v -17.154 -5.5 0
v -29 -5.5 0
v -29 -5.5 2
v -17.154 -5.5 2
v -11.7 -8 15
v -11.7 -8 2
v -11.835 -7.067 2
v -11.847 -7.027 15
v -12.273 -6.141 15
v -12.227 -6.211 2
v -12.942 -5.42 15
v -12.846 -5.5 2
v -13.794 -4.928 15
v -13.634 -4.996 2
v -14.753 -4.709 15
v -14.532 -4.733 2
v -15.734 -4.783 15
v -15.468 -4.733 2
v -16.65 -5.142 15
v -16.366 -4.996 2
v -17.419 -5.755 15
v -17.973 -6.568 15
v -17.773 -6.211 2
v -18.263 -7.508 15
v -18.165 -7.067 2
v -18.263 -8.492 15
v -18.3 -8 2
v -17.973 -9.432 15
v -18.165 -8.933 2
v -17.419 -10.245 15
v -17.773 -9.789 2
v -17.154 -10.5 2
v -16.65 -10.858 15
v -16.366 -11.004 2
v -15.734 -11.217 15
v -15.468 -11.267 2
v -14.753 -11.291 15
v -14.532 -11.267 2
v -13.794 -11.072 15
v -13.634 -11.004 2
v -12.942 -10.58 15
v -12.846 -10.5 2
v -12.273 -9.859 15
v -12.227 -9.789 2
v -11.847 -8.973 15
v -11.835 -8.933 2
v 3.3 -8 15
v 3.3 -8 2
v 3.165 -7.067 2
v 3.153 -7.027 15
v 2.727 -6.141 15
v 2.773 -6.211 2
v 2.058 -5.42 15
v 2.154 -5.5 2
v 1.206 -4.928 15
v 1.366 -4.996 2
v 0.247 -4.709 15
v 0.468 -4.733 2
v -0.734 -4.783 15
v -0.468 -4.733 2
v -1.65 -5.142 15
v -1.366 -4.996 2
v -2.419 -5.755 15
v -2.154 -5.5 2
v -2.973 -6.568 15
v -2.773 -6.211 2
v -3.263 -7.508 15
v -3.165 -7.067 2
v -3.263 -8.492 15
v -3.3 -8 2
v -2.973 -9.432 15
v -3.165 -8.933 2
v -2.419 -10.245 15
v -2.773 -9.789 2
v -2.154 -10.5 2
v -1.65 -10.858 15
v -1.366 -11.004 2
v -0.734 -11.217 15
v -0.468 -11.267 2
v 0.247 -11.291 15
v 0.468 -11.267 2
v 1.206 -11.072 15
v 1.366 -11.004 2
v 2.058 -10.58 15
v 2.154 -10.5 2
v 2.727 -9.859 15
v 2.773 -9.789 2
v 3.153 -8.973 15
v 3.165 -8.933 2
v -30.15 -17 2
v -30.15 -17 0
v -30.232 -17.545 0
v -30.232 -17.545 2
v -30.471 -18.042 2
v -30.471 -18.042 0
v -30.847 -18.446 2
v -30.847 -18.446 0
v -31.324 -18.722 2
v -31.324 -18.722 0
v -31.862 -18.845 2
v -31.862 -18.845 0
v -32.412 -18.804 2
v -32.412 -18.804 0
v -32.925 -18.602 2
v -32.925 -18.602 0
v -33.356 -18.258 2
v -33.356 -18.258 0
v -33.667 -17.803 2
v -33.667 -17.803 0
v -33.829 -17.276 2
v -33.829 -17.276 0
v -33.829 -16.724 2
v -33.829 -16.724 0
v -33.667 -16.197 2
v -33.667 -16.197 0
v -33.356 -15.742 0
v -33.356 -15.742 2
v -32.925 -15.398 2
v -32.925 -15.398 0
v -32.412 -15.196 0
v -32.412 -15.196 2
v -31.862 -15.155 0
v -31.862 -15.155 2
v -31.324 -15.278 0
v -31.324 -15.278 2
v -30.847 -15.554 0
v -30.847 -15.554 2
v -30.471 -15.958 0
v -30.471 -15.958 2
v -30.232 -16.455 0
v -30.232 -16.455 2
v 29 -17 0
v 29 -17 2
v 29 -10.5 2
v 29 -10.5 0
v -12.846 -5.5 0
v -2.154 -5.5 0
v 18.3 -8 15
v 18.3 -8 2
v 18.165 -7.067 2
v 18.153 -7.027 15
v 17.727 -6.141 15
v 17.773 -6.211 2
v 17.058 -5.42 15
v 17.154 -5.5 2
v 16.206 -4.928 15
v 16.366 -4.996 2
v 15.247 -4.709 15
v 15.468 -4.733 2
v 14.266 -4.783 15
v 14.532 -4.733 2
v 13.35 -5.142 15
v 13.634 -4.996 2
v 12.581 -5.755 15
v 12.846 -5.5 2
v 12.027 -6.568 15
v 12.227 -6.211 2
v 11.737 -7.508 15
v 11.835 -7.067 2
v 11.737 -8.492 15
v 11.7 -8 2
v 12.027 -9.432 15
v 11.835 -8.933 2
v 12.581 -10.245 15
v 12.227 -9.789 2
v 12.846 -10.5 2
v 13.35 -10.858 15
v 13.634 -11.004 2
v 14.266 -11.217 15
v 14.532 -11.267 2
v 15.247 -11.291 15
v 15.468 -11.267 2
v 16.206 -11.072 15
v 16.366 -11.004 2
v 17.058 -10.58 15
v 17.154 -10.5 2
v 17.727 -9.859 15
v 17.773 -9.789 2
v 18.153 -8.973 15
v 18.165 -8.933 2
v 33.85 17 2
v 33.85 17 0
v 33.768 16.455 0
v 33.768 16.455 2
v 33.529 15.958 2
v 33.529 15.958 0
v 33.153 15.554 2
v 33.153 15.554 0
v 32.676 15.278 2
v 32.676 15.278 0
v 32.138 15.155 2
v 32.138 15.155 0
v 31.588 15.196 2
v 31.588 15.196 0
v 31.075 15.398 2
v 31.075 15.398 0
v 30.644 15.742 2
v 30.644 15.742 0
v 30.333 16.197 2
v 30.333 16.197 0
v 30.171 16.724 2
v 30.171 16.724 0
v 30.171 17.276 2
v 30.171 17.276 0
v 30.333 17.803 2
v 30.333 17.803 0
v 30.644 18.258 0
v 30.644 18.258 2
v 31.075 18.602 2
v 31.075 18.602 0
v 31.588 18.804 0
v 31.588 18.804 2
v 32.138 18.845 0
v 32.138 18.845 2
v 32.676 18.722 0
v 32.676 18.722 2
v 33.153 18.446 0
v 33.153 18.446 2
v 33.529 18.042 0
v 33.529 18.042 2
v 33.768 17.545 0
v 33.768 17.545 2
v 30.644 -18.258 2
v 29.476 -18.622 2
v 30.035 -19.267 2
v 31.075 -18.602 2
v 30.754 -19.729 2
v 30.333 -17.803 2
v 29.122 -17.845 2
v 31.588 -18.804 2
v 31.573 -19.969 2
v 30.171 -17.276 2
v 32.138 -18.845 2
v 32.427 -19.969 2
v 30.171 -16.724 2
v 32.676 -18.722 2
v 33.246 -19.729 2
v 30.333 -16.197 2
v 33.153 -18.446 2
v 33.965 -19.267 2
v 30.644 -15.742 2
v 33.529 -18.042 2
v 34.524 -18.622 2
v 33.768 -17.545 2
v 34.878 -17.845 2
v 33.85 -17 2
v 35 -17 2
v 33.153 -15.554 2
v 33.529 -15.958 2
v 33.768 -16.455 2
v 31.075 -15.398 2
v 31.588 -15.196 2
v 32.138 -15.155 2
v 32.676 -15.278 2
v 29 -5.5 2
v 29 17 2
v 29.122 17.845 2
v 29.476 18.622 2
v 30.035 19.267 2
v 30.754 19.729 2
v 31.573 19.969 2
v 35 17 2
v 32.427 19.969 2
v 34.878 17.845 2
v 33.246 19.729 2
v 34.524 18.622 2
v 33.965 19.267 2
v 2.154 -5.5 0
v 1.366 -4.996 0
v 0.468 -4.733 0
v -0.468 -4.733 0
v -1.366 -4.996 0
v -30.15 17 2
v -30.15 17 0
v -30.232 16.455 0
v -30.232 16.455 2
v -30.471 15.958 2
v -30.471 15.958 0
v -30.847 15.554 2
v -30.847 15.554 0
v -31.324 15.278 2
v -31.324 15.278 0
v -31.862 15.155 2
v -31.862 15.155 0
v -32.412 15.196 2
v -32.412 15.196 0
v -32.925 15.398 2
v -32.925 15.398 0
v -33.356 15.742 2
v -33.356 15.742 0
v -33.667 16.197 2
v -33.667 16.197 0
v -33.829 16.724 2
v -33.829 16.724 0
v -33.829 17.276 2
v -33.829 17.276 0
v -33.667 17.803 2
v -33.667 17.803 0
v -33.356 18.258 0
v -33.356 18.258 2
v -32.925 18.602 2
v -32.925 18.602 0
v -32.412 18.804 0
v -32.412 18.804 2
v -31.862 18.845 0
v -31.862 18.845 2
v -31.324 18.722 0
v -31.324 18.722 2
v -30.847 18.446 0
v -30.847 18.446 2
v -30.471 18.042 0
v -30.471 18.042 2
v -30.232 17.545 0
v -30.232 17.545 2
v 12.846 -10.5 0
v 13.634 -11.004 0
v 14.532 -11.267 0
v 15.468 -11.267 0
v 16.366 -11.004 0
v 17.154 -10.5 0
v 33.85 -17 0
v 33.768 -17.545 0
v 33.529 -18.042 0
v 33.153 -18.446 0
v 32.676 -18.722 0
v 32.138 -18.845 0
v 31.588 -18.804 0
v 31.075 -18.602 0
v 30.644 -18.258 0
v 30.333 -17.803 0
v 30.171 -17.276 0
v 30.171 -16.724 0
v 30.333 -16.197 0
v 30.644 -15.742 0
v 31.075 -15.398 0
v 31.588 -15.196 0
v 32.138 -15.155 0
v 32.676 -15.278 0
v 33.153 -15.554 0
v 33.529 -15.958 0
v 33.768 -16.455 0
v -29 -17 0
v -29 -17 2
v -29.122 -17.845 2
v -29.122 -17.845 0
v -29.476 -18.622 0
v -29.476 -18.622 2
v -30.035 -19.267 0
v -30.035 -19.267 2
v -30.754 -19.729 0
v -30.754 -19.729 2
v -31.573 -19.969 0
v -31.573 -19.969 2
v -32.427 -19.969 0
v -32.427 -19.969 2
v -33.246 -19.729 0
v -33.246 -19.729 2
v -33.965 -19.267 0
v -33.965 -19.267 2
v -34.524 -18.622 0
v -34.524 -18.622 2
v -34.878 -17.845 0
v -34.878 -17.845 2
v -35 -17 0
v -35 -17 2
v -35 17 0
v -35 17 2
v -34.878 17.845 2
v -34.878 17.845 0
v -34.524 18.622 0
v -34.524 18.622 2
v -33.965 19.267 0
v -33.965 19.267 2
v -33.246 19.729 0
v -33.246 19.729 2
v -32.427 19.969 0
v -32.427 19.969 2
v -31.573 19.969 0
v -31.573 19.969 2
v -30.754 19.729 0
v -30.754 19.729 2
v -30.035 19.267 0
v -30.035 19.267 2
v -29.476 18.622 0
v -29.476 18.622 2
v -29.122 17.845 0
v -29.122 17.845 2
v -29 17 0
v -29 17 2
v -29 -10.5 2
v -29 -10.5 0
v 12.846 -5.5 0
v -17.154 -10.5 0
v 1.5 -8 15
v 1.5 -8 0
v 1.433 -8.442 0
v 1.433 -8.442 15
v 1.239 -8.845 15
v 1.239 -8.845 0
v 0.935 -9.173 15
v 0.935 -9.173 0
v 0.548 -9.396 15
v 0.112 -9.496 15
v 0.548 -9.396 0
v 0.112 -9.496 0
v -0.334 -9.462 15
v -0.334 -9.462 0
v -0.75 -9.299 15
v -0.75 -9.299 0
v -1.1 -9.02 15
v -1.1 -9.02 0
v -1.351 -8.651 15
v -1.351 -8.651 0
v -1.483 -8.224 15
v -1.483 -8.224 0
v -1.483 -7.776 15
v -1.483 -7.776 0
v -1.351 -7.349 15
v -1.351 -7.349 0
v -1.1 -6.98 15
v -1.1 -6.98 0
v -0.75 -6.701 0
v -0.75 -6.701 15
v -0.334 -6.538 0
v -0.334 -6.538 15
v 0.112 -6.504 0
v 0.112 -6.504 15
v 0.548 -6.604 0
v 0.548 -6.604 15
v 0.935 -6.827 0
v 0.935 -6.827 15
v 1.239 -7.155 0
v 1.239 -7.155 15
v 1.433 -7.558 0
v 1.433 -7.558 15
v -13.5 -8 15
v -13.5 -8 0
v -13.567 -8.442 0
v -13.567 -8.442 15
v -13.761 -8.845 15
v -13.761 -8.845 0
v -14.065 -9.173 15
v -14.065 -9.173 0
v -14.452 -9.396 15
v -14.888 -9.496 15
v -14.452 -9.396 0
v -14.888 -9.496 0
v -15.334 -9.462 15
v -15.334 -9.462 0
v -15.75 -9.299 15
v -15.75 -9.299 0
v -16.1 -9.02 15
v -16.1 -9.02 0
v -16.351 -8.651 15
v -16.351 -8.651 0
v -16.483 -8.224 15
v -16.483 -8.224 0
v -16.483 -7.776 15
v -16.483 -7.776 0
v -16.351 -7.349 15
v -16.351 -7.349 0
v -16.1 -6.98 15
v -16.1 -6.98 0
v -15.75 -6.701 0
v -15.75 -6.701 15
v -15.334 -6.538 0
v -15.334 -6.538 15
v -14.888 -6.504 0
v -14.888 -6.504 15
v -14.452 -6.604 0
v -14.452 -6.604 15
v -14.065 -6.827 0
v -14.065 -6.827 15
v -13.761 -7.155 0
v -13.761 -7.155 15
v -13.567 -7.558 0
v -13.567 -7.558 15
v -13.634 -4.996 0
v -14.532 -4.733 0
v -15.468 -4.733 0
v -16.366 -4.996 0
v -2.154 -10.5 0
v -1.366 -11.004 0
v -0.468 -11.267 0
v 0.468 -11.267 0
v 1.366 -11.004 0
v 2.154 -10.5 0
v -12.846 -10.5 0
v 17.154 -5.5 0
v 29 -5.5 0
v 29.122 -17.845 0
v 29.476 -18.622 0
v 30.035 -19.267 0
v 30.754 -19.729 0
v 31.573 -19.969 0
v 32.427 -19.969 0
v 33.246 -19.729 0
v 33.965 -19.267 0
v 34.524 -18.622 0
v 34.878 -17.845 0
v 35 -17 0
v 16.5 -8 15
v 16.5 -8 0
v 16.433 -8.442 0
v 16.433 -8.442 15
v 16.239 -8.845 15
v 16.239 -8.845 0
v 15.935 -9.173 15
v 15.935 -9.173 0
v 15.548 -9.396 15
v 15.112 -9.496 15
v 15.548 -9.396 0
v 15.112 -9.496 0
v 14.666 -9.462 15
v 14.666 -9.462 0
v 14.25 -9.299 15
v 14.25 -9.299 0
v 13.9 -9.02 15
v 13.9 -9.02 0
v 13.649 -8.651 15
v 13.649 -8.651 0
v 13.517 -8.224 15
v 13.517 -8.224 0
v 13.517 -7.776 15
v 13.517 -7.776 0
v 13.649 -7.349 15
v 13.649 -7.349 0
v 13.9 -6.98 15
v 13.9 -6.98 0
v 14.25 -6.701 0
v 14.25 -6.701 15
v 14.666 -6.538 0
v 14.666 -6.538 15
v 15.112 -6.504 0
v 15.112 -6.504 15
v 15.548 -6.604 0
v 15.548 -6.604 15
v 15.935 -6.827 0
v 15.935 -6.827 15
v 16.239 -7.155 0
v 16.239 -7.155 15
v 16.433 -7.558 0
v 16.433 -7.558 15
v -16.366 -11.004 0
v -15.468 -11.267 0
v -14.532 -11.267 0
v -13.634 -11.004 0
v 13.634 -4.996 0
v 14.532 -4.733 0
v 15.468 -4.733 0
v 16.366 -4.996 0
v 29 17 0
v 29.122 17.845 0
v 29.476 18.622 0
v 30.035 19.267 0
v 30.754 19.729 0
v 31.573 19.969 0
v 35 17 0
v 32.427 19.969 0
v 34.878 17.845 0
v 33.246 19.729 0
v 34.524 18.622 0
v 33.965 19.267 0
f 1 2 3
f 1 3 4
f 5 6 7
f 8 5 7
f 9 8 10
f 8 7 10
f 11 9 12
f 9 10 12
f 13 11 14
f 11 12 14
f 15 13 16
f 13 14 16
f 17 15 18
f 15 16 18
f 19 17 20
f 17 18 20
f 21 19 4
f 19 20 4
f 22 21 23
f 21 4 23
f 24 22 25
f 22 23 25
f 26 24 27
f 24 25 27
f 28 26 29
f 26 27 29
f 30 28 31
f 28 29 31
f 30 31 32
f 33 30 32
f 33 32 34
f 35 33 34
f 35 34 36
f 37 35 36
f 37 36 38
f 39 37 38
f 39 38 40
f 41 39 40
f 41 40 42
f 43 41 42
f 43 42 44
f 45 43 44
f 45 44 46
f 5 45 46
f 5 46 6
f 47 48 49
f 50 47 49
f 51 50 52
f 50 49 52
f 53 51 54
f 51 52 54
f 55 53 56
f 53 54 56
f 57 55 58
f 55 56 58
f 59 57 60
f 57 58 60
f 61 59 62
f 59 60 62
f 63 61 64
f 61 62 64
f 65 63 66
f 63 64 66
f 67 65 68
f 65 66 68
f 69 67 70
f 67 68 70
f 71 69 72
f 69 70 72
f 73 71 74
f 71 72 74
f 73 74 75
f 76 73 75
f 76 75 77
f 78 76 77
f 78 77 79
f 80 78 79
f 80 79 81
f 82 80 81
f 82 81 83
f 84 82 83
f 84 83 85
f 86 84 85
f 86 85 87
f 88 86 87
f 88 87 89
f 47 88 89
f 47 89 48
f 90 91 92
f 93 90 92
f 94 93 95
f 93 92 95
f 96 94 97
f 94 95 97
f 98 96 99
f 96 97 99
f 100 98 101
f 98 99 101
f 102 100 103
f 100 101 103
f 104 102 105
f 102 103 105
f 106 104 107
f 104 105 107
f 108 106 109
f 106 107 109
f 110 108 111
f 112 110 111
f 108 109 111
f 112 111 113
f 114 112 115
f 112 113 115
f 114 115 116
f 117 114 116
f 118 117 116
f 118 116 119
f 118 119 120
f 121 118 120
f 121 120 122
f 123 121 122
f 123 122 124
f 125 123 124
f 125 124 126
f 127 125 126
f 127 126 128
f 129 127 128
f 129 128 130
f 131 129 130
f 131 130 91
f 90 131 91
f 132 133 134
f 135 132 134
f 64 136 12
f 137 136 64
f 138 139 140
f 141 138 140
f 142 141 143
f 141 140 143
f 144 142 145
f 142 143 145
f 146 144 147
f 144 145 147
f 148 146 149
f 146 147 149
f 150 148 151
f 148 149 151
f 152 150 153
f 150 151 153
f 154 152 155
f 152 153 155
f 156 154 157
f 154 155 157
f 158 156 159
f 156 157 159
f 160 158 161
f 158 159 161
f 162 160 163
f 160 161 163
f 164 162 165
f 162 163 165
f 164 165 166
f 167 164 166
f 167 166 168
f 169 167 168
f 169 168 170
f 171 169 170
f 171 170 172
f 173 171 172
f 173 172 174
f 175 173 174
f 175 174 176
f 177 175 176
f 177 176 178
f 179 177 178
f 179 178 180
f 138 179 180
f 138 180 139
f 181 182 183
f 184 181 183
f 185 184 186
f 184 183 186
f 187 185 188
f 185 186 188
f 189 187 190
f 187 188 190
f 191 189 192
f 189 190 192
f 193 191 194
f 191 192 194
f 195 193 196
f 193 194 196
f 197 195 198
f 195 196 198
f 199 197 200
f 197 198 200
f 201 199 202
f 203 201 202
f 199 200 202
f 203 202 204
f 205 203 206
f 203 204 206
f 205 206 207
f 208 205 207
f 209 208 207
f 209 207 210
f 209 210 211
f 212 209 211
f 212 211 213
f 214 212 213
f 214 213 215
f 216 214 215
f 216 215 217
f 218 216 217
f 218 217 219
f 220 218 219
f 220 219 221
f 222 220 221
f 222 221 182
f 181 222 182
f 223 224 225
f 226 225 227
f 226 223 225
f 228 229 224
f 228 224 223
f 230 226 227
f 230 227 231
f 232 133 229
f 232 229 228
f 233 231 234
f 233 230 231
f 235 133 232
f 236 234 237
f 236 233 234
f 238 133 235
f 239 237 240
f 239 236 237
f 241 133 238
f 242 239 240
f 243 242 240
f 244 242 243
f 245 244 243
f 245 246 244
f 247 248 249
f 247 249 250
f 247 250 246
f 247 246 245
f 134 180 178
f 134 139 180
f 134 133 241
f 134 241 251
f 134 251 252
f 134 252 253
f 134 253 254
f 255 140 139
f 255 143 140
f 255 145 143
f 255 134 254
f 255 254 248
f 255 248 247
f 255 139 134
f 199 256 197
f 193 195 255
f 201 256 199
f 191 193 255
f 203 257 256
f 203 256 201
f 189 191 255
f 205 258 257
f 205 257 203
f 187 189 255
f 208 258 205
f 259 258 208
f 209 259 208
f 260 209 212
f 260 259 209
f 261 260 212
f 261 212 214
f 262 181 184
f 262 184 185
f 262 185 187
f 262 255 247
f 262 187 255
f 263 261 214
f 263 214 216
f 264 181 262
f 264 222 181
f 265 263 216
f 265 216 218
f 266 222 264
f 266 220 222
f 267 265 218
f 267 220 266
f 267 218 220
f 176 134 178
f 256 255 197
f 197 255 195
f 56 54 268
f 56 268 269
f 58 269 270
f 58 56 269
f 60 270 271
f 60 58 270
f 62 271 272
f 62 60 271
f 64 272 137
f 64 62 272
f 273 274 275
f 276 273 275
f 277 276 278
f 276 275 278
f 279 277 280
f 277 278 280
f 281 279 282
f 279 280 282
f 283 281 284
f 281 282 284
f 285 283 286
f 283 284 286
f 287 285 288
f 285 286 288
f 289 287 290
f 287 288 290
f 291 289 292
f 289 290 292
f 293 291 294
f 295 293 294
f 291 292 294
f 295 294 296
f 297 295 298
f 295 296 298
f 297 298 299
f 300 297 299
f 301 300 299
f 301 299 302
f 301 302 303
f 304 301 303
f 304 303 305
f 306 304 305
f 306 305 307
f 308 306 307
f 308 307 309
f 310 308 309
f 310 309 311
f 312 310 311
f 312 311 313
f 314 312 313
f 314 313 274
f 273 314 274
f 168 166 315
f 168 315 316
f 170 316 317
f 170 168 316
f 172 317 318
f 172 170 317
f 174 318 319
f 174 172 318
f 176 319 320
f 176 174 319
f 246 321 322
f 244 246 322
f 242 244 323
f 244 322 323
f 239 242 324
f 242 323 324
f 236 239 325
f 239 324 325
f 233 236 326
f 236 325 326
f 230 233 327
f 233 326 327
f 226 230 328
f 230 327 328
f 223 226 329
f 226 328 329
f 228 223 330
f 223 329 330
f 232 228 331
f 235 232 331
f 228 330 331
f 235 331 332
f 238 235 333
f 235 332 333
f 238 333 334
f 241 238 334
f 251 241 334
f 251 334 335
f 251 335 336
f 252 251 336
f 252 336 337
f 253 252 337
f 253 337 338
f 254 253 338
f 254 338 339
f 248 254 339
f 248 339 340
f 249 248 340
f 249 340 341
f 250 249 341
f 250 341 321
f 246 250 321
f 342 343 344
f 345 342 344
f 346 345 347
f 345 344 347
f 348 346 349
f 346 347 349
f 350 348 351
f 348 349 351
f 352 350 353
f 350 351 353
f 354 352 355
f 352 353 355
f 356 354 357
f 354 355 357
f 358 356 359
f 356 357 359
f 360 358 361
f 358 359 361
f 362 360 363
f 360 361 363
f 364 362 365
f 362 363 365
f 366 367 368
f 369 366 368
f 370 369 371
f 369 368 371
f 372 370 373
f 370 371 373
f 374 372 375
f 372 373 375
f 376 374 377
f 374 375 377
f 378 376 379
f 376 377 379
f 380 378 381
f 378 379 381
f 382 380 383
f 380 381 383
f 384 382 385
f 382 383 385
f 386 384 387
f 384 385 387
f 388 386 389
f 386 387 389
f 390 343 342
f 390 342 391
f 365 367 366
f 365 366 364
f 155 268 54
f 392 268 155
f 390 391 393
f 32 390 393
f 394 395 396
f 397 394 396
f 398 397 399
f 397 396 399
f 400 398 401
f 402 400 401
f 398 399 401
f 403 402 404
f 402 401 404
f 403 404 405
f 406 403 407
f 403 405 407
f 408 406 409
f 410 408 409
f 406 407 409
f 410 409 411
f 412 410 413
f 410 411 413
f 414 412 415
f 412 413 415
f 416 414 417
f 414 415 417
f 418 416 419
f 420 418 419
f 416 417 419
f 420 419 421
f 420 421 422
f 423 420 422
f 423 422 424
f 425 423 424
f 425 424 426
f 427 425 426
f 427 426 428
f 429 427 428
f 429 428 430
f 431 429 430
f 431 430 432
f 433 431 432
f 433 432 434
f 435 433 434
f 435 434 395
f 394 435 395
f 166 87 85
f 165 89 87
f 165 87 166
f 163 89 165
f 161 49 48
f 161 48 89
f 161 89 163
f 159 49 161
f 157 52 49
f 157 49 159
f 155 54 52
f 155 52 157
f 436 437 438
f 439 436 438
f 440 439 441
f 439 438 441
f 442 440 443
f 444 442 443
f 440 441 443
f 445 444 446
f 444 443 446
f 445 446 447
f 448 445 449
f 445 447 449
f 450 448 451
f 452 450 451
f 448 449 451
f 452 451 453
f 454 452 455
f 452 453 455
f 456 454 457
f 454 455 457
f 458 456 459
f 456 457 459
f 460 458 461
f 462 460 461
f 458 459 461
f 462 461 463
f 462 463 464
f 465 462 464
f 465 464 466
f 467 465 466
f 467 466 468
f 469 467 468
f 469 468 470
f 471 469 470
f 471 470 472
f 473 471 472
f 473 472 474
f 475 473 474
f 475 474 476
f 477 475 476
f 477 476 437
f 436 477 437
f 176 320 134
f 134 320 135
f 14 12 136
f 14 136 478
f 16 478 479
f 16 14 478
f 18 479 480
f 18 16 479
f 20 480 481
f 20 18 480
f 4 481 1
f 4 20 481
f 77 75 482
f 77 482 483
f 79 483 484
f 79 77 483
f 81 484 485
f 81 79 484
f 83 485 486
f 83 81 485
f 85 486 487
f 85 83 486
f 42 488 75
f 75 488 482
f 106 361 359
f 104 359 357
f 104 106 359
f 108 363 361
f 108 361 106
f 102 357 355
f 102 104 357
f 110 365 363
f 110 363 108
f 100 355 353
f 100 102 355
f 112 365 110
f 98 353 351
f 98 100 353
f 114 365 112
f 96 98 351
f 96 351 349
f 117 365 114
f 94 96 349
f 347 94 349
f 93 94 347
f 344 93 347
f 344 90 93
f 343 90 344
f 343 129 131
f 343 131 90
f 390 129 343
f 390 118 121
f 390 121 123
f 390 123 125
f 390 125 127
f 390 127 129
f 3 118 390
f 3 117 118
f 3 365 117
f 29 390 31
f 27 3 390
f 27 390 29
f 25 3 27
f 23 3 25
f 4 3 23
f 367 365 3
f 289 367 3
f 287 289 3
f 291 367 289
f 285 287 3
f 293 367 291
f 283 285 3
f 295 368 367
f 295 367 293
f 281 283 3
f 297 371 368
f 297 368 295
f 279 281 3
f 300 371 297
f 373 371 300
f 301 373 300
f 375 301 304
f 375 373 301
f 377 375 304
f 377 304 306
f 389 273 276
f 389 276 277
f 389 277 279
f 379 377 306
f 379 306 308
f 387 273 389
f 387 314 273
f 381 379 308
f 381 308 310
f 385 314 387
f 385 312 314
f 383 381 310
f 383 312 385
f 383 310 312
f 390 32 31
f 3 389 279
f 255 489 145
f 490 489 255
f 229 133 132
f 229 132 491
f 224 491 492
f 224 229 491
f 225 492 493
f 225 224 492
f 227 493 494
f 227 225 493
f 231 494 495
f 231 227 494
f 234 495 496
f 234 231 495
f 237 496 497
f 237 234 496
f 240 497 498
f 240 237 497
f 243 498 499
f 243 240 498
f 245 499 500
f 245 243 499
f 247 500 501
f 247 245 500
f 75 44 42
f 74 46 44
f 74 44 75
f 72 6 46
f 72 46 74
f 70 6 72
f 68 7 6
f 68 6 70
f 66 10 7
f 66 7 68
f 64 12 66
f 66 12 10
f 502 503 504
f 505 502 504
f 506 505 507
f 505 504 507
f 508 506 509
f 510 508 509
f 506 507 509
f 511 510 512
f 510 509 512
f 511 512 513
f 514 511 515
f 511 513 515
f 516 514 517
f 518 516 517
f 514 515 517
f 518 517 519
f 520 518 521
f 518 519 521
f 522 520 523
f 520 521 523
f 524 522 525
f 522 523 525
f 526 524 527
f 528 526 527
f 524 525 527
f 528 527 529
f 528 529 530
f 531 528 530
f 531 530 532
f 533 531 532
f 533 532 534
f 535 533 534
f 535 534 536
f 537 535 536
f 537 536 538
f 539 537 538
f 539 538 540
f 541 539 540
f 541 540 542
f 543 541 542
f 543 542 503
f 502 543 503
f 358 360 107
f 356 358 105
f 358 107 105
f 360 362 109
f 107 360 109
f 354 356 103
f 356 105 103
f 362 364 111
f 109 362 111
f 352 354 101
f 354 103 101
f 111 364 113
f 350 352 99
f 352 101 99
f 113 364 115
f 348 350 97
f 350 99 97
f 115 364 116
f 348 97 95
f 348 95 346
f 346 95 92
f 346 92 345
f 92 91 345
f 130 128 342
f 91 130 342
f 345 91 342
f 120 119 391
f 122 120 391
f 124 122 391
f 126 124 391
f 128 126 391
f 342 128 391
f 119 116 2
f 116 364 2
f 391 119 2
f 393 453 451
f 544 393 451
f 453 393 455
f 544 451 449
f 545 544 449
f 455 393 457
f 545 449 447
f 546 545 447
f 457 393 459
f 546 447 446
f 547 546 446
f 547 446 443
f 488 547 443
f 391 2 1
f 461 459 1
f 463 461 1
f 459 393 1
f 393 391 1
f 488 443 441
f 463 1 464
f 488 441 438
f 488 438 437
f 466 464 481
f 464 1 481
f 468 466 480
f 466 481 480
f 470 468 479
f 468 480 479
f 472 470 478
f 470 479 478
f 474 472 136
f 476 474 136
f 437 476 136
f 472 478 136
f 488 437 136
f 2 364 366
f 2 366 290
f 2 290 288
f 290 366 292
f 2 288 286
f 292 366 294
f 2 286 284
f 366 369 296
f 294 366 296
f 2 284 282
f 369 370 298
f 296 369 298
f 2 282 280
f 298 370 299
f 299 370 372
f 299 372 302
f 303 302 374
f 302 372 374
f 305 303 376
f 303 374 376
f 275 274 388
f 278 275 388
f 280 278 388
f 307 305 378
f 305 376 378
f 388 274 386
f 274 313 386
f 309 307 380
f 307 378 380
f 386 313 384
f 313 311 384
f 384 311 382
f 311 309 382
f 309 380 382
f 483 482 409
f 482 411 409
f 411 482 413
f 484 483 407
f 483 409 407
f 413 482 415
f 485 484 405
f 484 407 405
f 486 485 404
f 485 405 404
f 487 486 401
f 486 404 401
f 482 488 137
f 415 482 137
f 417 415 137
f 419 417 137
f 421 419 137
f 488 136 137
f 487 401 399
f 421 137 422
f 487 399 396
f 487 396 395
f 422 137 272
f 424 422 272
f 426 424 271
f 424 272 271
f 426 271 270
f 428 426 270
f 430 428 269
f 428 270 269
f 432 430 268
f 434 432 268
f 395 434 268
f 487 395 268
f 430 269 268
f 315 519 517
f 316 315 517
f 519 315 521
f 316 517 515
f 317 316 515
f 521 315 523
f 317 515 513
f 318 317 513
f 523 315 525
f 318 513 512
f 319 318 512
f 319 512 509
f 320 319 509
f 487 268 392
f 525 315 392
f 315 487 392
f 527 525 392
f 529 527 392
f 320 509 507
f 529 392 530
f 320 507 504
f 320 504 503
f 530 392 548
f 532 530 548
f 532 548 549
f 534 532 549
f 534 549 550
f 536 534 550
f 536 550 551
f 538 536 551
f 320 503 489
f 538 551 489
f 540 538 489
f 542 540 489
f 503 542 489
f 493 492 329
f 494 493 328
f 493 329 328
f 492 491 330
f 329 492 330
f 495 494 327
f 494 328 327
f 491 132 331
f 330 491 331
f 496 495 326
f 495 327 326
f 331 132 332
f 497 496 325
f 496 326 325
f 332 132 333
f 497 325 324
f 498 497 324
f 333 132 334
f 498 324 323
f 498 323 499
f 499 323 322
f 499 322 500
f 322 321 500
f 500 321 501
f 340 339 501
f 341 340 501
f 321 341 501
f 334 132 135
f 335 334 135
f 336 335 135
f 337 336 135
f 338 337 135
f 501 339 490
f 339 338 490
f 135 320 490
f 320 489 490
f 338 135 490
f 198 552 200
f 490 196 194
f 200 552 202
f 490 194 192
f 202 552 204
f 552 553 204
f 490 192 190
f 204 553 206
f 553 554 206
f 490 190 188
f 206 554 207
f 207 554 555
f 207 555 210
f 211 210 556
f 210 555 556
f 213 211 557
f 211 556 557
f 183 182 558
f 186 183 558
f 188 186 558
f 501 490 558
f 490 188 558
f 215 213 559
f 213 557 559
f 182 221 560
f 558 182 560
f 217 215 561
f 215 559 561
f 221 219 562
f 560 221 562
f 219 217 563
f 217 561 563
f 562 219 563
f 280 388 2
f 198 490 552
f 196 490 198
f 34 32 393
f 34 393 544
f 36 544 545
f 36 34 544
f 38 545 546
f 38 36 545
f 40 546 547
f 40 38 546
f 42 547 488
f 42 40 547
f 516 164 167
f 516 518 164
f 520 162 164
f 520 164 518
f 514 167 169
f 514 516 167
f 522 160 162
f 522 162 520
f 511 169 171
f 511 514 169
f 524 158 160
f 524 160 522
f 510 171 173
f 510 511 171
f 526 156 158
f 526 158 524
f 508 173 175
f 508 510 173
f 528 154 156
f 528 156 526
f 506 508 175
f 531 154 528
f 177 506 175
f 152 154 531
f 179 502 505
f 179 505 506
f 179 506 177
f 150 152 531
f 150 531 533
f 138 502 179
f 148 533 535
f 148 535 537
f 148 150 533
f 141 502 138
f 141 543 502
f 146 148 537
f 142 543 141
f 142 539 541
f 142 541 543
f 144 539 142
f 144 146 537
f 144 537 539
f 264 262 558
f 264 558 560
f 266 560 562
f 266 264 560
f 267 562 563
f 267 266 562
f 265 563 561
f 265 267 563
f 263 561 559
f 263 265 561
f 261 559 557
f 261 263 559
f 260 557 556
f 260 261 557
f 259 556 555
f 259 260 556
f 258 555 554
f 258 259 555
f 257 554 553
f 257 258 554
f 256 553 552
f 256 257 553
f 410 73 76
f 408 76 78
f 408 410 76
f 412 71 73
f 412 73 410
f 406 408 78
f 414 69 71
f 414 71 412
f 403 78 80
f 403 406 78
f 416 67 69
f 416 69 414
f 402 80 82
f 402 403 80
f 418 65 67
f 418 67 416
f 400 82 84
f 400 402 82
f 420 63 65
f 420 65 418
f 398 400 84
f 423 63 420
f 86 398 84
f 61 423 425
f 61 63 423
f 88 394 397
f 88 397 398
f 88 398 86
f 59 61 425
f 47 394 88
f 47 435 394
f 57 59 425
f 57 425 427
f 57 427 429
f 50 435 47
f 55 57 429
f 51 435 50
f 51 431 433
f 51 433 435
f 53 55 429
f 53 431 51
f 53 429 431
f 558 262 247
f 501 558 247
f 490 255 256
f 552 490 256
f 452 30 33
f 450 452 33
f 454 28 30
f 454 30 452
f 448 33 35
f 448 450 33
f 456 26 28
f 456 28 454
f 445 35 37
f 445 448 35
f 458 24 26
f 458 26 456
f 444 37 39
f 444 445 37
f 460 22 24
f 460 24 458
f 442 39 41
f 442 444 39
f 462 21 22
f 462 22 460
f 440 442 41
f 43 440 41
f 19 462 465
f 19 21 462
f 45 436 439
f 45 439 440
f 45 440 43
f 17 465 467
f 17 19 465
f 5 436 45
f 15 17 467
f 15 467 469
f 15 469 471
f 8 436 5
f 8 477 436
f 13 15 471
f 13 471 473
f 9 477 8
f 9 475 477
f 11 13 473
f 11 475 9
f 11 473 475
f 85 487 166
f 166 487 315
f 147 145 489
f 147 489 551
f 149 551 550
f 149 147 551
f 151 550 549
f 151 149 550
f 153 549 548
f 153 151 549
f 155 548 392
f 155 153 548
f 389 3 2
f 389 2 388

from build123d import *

# Parameters (mm, degrees)
SKETCH_W          = 70
SKETCH_H          = 5
PAD_DEPTH         = 2
PAD001_DEPTH      = 2
SKETCH002_R       = 3.3
PAD002_DEPTH      = 13
PAD002_DEPTH_BACK = 2
SKETCH003_R       = 1.5
SKETCH003_R_2     = 1.85
POCKET_DEPTH      = 15.001


with BuildPart() as part:
    # Sketch → Pad (new body)
    with BuildSketch(Plane.XY):
        with Locations((0, -8)):
            Rectangle(SKETCH_W, SKETCH_H)
    extrude(amount=PAD_DEPTH)

    # Sketch001 → Pad001 (new body)
    with BuildSketch(Plane.XY.offset(2)):
        with BuildLine():
            Line((35, 16.999981), (35, -17.000015))
            ThreePointArc((29, -17.000012), (31.999999, -20), (35, -17.000015))
            Line((29, -17.000012), (29, 16.999983))
            ThreePointArc((35, 16.999981), (32.000001, 20), (29, 16.999983))
        make_face()
    pad001 = extrude(amount=-PAD001_DEPTH)

    # Mirrored: Pad001 across Sketch001 V_Axis
    add(pad001.mirror(Plane(origin=(0, 0, 2), x_dir=(0, 0, 1), z_dir=(1, 0, 0))))

    # Sketch002 → Pad002 (new body, two sides)
    with BuildSketch(Plane.XY.offset(2)) as pad002_sk:
        with Locations((0, -8)):
            Circle(SKETCH002_R)
        with Locations((-15, -8)):
            Circle(SKETCH002_R)
        with Locations((15, -8)):
            Circle(SKETCH002_R)
    extrude(amount=PAD002_DEPTH)
    extrude(pad002_sk.sketch, amount=-PAD002_DEPTH_BACK)

    # Sketch003 → Pocket (cut, through all)
    with BuildSketch(Plane(origin=(0, 0, 0), x_dir=(1, 0, 0), z_dir=(0, 0, -1))):
        with Locations((0, 8)):
            Circle(SKETCH003_R)
        with Locations((-15, 8)):
            Circle(SKETCH003_R)
        with Locations((15, 8)):
            Circle(SKETCH003_R)
        with Locations((-32, -17)):
            Circle(SKETCH003_R_2)
        with Locations((-32, 17)):
            Circle(SKETCH003_R_2)
        with Locations((32, 17)):
            Circle(SKETCH003_R_2)
        with Locations((32, -17)):
            Circle(SKETCH003_R_2)
    extrude(amount=-POCKET_DEPTH, mode=Mode.SUBTRACT)


solid = part.part
